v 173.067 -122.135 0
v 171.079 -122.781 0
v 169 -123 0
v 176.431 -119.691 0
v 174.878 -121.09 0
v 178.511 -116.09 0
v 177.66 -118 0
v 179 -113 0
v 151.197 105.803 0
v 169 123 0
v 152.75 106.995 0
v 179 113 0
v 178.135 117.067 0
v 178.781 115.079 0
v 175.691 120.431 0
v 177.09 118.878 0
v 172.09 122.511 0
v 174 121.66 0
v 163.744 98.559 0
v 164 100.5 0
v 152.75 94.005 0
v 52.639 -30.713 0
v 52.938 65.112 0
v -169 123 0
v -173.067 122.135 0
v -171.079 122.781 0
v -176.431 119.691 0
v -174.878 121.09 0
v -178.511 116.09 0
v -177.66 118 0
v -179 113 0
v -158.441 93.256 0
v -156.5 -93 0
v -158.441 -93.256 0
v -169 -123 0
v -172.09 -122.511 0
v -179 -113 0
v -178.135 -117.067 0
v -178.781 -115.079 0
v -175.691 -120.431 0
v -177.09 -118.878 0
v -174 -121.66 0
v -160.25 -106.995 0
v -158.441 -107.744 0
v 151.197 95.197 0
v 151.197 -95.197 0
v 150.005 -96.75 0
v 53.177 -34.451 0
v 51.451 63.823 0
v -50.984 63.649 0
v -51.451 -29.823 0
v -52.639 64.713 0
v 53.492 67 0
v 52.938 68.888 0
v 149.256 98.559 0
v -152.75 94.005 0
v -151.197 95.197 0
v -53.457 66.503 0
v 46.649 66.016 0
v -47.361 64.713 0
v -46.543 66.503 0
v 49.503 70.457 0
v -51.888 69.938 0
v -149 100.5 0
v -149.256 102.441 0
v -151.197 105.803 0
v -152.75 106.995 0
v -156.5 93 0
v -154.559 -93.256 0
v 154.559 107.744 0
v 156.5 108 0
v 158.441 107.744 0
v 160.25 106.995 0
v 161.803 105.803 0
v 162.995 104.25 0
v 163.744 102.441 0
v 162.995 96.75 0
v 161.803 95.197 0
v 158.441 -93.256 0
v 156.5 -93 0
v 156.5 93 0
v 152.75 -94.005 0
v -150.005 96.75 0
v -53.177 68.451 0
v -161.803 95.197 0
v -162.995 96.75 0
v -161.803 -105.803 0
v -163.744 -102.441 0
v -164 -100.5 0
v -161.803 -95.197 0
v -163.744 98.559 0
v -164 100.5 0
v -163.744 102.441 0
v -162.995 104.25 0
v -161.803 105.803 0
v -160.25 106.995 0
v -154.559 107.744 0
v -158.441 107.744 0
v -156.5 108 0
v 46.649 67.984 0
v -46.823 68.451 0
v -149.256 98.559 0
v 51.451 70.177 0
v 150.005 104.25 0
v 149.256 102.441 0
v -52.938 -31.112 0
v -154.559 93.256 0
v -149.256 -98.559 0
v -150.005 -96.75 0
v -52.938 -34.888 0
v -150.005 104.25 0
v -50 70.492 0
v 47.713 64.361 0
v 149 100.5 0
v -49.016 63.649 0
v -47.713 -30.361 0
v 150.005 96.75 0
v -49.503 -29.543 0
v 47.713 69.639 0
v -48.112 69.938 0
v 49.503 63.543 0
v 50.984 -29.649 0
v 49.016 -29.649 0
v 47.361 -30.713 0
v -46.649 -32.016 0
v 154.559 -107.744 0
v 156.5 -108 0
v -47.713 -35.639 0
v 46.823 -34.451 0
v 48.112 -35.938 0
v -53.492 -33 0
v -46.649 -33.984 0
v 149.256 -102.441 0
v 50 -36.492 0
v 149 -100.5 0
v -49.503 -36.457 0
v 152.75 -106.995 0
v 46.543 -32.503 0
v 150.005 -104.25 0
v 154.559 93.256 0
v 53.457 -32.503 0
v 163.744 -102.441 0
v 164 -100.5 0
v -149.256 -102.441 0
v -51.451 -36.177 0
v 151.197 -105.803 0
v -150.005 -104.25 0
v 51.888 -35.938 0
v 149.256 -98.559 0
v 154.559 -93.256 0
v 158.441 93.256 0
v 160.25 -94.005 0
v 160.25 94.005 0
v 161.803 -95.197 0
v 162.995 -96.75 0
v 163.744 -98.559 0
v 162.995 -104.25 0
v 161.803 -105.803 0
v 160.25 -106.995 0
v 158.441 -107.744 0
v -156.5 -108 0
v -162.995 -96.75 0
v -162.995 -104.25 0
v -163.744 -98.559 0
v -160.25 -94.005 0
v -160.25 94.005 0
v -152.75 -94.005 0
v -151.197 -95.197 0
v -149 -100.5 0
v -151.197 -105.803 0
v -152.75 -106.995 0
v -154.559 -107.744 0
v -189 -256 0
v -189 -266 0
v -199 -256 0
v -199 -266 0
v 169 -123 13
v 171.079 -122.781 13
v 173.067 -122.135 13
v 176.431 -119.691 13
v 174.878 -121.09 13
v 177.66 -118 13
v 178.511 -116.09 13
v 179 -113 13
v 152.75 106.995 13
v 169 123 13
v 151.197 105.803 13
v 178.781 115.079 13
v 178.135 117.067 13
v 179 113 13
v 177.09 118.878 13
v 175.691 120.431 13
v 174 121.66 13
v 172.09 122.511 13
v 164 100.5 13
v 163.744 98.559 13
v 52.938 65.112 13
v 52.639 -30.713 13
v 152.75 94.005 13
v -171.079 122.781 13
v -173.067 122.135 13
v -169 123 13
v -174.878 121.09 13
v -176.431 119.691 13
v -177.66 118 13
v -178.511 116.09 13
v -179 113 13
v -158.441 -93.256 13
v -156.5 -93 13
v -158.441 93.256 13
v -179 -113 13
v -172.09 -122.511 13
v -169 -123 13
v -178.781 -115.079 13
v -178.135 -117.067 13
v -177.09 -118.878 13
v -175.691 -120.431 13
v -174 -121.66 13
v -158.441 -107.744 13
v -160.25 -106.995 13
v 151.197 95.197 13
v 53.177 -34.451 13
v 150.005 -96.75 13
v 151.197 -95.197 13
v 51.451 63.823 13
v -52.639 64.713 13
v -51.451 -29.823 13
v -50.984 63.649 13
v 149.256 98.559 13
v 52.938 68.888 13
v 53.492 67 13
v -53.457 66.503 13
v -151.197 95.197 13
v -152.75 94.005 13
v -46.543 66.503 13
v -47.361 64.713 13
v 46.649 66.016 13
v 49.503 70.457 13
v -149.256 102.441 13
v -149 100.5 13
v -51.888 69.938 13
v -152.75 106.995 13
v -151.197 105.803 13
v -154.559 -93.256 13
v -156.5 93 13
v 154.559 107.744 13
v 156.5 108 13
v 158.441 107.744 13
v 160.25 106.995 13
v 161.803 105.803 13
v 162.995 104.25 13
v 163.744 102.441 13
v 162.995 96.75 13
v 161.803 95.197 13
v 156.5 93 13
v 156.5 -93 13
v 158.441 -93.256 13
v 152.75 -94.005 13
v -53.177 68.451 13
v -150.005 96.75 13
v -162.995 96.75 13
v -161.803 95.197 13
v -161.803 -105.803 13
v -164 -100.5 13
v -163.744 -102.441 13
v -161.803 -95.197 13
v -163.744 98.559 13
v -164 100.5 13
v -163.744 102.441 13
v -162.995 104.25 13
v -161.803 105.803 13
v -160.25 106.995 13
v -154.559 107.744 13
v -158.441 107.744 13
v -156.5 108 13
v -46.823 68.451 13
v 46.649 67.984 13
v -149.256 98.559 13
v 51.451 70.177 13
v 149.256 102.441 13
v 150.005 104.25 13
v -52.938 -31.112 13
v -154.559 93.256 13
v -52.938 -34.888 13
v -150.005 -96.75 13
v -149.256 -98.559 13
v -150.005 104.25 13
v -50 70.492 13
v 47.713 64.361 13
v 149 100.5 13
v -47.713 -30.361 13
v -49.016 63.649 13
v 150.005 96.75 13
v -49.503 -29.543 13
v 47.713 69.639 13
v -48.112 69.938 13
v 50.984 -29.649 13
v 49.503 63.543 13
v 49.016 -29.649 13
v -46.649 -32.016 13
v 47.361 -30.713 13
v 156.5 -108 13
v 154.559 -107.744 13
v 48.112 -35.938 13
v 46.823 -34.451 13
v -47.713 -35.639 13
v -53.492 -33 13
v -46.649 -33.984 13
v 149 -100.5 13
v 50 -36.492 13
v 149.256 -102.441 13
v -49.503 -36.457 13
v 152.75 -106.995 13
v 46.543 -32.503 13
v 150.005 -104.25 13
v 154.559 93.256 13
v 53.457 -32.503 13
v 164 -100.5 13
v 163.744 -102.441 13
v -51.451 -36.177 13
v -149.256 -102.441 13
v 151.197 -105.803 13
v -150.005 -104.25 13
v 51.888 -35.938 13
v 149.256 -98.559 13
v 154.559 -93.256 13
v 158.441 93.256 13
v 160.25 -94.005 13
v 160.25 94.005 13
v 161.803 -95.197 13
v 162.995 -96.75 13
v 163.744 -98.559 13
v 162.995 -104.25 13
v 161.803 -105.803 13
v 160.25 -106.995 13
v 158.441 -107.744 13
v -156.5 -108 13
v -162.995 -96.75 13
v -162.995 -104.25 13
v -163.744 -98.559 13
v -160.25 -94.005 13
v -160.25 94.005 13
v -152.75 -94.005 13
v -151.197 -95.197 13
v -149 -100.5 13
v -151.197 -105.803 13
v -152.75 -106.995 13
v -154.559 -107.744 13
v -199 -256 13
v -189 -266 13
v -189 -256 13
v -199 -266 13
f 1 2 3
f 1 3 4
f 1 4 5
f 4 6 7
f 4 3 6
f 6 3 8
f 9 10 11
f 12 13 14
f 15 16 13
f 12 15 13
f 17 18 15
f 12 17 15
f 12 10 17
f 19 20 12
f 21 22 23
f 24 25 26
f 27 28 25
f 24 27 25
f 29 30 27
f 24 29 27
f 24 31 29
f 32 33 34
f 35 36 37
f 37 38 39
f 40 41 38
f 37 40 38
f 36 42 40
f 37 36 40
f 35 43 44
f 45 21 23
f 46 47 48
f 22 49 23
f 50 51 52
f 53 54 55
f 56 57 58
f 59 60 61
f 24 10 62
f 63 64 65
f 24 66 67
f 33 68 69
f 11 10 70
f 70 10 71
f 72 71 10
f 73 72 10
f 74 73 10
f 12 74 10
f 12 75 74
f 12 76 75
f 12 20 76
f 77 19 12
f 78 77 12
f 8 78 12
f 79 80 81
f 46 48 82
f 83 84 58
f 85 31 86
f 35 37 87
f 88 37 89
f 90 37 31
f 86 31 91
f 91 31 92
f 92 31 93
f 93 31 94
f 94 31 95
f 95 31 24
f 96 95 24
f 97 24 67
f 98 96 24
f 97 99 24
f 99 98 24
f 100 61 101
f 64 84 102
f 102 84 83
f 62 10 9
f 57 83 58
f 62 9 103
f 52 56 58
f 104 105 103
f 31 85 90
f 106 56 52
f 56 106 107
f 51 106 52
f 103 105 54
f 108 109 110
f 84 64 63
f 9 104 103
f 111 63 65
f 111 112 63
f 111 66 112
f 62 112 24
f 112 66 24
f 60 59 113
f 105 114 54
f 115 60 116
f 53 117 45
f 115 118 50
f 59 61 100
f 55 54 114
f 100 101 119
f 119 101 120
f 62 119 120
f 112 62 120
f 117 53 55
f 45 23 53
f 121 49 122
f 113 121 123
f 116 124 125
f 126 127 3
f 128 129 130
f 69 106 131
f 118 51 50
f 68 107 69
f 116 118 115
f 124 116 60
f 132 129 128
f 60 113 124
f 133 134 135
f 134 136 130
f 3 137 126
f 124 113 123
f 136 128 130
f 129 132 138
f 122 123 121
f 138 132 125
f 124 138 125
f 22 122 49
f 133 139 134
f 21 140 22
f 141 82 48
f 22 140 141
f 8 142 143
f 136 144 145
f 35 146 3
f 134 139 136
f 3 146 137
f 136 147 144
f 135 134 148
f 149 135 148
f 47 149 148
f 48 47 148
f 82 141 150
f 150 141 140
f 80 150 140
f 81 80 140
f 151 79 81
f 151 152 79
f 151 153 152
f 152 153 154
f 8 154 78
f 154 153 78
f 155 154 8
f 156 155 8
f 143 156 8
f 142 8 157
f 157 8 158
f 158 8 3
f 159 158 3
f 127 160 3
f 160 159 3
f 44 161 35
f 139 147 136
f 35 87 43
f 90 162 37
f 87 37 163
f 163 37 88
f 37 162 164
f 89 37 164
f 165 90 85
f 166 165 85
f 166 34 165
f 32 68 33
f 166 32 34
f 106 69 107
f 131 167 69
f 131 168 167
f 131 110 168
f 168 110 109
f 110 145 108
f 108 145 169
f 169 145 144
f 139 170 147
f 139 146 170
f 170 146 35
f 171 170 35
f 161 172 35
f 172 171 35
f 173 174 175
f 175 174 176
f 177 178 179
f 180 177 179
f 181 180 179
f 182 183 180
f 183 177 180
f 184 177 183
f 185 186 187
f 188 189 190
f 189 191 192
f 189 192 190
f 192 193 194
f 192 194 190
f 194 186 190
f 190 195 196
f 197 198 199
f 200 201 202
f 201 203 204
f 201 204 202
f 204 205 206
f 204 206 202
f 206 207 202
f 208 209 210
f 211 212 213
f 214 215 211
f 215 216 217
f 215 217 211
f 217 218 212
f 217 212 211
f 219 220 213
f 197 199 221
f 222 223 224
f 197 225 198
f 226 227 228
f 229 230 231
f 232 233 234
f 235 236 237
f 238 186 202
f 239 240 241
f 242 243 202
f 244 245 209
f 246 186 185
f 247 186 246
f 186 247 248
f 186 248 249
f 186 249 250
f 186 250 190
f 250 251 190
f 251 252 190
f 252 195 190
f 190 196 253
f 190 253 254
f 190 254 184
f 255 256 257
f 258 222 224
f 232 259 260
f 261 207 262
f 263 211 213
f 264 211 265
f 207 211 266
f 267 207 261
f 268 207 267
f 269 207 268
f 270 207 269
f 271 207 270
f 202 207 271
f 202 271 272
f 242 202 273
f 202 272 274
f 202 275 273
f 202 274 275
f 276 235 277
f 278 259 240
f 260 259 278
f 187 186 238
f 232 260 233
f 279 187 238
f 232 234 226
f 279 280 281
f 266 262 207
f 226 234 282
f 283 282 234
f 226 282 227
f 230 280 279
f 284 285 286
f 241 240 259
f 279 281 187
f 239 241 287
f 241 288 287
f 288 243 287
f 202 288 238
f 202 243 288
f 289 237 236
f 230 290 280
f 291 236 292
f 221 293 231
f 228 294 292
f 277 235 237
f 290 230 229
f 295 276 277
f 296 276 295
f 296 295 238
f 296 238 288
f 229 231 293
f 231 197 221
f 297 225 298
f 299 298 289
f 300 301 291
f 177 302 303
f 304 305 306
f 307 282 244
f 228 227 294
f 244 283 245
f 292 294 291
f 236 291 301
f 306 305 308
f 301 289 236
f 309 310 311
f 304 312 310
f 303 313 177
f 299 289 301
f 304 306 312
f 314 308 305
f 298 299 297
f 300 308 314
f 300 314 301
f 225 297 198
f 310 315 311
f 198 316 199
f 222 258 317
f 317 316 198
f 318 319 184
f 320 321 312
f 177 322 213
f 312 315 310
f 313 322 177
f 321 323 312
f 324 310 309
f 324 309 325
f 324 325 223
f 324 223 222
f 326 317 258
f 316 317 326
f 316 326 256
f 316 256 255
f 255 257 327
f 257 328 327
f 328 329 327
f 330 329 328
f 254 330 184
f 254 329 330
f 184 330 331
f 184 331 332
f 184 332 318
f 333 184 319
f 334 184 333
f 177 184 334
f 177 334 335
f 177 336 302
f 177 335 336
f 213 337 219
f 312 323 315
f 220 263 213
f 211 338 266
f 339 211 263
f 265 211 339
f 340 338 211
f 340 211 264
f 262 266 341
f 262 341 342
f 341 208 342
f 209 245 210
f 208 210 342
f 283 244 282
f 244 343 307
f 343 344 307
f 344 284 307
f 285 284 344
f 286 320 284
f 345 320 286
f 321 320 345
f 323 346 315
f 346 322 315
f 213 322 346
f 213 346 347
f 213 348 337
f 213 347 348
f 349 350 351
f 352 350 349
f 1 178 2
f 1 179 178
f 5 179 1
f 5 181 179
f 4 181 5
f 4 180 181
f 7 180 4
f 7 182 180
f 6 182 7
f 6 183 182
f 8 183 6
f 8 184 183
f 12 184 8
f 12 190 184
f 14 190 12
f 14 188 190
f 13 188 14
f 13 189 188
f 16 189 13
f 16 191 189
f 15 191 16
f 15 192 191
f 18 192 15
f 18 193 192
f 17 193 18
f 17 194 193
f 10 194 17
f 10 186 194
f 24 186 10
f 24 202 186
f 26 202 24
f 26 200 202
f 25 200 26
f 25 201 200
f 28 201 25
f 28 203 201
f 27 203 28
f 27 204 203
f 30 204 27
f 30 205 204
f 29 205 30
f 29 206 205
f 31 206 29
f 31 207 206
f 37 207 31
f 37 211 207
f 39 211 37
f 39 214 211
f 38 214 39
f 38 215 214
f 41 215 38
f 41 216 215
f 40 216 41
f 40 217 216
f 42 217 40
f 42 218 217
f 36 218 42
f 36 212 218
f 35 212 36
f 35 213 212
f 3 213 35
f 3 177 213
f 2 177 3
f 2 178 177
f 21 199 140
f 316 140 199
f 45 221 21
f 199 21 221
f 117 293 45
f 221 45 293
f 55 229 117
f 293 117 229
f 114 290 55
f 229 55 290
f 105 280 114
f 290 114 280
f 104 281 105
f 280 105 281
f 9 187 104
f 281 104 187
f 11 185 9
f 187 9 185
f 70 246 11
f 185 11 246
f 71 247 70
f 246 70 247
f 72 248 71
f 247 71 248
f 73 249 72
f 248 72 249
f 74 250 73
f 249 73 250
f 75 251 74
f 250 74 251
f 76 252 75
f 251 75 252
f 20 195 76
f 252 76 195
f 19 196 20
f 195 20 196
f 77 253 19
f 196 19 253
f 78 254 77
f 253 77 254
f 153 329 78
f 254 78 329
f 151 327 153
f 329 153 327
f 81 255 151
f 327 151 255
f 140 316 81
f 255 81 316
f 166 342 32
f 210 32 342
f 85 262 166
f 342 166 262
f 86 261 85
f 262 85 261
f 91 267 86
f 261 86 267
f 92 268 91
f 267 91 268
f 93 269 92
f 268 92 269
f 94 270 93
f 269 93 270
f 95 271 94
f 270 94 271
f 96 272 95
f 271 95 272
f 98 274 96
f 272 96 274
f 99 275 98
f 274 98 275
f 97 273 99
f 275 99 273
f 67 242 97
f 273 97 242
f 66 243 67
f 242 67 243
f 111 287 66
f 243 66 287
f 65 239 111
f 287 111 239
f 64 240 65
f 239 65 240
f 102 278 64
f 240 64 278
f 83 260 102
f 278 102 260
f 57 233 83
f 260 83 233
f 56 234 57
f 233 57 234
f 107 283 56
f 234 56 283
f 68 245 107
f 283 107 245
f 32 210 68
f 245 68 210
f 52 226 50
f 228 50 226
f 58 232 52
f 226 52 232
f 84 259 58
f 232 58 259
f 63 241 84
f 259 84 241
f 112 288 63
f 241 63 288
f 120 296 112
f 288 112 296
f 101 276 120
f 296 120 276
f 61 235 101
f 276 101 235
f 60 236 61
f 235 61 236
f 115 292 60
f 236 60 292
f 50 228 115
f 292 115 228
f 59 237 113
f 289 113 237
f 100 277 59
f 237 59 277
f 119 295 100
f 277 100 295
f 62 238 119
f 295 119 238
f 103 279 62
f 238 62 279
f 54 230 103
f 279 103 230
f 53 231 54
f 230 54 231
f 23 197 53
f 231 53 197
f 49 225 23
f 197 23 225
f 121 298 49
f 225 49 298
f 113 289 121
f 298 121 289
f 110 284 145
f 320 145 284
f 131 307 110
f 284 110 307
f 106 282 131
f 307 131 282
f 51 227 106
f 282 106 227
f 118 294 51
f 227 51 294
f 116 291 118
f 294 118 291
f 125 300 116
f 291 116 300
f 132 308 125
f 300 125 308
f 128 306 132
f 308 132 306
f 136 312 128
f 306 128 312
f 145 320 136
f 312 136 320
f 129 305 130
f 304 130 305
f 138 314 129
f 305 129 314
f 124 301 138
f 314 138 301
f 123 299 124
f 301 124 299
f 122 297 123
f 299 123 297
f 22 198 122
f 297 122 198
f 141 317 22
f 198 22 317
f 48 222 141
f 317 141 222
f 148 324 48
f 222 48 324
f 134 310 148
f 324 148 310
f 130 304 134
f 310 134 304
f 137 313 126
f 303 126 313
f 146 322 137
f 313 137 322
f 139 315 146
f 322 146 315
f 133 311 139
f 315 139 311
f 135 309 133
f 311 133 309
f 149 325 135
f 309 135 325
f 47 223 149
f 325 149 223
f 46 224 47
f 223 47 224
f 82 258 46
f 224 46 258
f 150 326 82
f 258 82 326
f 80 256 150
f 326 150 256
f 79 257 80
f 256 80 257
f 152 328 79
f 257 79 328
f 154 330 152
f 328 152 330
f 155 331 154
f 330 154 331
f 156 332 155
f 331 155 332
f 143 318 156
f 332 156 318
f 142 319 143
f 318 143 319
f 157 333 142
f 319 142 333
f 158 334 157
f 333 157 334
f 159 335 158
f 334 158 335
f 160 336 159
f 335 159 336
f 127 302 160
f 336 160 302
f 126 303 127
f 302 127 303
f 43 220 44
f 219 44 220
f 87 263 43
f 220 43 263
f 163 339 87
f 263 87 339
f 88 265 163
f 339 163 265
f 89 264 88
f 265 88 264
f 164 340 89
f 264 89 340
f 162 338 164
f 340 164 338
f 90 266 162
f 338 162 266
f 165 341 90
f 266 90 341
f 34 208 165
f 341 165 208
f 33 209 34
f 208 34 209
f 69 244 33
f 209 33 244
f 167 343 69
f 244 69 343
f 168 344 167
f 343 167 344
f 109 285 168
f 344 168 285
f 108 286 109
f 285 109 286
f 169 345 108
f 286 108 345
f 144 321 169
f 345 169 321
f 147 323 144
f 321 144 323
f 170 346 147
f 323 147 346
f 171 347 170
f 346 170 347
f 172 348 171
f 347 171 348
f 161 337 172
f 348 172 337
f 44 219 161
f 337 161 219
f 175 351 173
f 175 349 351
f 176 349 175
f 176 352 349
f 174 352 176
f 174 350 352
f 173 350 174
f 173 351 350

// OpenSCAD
laptop_x=358;
laptop_y=246;
laptop_corner=10;

wood=13;
base=wood/2;

vesa_sizes=[100];
mountpoints=[140-laptop_y/2];

pad=15;
pad_offset=15+15/2;

in=25.4;
bit=in/4;
screw=bit*1.1;
pocket_overhang=bit;

module laptop() {
	offset(laptop_corner)
	offset(-laptop_corner)
	square([laptop_x,laptop_y],center=true);
}

module vesa() {
	for(mountpoint=mountpoints)
	translate([0,mountpoint])
	for(vesa=vesa_sizes)
	for(r=[0:90:359])
	rotate([0,0,r])
	translate([vesa/2,vesa/2])
	circle(d=screw);	
}

module body() {
	laptop();
}

module dirror_y() {
	children();
	mirror([0,1])
	children();
}

module dirror_x() {
	children();
	mirror([1,0])
	children();
}

module pads(){ 
	dirror_x()
	dirror_y()
	translate([laptop_x/2-pad_offset,laptop_y/2-pad_offset])
	circle(d=pad);
}

module assembled() {
	linear_extrude(height=wood)
	outside_profile();
}

// RENDER svg
module outside_profile() {
	difference() {
		body();
		vesa();
		pads();
	}
	anchor();
}

anchor=10;
anchor_x=-laptop_x/2-anchor*2;
anchor_y=-laptop_y-anchor*2;

preview_height=1;

module preview() {
	color("red")
	linear_extrude(height=preview_height)
	outside_profile();

	color("blue")
	translate([0,0,1])
	linear_extrude(height=preview_height)
	pockets();
}

//preview();
assembled();

module anchor() {
	color("lime")
	translate([anchor_x,anchor_y])
	square([anchor, anchor]);
}
